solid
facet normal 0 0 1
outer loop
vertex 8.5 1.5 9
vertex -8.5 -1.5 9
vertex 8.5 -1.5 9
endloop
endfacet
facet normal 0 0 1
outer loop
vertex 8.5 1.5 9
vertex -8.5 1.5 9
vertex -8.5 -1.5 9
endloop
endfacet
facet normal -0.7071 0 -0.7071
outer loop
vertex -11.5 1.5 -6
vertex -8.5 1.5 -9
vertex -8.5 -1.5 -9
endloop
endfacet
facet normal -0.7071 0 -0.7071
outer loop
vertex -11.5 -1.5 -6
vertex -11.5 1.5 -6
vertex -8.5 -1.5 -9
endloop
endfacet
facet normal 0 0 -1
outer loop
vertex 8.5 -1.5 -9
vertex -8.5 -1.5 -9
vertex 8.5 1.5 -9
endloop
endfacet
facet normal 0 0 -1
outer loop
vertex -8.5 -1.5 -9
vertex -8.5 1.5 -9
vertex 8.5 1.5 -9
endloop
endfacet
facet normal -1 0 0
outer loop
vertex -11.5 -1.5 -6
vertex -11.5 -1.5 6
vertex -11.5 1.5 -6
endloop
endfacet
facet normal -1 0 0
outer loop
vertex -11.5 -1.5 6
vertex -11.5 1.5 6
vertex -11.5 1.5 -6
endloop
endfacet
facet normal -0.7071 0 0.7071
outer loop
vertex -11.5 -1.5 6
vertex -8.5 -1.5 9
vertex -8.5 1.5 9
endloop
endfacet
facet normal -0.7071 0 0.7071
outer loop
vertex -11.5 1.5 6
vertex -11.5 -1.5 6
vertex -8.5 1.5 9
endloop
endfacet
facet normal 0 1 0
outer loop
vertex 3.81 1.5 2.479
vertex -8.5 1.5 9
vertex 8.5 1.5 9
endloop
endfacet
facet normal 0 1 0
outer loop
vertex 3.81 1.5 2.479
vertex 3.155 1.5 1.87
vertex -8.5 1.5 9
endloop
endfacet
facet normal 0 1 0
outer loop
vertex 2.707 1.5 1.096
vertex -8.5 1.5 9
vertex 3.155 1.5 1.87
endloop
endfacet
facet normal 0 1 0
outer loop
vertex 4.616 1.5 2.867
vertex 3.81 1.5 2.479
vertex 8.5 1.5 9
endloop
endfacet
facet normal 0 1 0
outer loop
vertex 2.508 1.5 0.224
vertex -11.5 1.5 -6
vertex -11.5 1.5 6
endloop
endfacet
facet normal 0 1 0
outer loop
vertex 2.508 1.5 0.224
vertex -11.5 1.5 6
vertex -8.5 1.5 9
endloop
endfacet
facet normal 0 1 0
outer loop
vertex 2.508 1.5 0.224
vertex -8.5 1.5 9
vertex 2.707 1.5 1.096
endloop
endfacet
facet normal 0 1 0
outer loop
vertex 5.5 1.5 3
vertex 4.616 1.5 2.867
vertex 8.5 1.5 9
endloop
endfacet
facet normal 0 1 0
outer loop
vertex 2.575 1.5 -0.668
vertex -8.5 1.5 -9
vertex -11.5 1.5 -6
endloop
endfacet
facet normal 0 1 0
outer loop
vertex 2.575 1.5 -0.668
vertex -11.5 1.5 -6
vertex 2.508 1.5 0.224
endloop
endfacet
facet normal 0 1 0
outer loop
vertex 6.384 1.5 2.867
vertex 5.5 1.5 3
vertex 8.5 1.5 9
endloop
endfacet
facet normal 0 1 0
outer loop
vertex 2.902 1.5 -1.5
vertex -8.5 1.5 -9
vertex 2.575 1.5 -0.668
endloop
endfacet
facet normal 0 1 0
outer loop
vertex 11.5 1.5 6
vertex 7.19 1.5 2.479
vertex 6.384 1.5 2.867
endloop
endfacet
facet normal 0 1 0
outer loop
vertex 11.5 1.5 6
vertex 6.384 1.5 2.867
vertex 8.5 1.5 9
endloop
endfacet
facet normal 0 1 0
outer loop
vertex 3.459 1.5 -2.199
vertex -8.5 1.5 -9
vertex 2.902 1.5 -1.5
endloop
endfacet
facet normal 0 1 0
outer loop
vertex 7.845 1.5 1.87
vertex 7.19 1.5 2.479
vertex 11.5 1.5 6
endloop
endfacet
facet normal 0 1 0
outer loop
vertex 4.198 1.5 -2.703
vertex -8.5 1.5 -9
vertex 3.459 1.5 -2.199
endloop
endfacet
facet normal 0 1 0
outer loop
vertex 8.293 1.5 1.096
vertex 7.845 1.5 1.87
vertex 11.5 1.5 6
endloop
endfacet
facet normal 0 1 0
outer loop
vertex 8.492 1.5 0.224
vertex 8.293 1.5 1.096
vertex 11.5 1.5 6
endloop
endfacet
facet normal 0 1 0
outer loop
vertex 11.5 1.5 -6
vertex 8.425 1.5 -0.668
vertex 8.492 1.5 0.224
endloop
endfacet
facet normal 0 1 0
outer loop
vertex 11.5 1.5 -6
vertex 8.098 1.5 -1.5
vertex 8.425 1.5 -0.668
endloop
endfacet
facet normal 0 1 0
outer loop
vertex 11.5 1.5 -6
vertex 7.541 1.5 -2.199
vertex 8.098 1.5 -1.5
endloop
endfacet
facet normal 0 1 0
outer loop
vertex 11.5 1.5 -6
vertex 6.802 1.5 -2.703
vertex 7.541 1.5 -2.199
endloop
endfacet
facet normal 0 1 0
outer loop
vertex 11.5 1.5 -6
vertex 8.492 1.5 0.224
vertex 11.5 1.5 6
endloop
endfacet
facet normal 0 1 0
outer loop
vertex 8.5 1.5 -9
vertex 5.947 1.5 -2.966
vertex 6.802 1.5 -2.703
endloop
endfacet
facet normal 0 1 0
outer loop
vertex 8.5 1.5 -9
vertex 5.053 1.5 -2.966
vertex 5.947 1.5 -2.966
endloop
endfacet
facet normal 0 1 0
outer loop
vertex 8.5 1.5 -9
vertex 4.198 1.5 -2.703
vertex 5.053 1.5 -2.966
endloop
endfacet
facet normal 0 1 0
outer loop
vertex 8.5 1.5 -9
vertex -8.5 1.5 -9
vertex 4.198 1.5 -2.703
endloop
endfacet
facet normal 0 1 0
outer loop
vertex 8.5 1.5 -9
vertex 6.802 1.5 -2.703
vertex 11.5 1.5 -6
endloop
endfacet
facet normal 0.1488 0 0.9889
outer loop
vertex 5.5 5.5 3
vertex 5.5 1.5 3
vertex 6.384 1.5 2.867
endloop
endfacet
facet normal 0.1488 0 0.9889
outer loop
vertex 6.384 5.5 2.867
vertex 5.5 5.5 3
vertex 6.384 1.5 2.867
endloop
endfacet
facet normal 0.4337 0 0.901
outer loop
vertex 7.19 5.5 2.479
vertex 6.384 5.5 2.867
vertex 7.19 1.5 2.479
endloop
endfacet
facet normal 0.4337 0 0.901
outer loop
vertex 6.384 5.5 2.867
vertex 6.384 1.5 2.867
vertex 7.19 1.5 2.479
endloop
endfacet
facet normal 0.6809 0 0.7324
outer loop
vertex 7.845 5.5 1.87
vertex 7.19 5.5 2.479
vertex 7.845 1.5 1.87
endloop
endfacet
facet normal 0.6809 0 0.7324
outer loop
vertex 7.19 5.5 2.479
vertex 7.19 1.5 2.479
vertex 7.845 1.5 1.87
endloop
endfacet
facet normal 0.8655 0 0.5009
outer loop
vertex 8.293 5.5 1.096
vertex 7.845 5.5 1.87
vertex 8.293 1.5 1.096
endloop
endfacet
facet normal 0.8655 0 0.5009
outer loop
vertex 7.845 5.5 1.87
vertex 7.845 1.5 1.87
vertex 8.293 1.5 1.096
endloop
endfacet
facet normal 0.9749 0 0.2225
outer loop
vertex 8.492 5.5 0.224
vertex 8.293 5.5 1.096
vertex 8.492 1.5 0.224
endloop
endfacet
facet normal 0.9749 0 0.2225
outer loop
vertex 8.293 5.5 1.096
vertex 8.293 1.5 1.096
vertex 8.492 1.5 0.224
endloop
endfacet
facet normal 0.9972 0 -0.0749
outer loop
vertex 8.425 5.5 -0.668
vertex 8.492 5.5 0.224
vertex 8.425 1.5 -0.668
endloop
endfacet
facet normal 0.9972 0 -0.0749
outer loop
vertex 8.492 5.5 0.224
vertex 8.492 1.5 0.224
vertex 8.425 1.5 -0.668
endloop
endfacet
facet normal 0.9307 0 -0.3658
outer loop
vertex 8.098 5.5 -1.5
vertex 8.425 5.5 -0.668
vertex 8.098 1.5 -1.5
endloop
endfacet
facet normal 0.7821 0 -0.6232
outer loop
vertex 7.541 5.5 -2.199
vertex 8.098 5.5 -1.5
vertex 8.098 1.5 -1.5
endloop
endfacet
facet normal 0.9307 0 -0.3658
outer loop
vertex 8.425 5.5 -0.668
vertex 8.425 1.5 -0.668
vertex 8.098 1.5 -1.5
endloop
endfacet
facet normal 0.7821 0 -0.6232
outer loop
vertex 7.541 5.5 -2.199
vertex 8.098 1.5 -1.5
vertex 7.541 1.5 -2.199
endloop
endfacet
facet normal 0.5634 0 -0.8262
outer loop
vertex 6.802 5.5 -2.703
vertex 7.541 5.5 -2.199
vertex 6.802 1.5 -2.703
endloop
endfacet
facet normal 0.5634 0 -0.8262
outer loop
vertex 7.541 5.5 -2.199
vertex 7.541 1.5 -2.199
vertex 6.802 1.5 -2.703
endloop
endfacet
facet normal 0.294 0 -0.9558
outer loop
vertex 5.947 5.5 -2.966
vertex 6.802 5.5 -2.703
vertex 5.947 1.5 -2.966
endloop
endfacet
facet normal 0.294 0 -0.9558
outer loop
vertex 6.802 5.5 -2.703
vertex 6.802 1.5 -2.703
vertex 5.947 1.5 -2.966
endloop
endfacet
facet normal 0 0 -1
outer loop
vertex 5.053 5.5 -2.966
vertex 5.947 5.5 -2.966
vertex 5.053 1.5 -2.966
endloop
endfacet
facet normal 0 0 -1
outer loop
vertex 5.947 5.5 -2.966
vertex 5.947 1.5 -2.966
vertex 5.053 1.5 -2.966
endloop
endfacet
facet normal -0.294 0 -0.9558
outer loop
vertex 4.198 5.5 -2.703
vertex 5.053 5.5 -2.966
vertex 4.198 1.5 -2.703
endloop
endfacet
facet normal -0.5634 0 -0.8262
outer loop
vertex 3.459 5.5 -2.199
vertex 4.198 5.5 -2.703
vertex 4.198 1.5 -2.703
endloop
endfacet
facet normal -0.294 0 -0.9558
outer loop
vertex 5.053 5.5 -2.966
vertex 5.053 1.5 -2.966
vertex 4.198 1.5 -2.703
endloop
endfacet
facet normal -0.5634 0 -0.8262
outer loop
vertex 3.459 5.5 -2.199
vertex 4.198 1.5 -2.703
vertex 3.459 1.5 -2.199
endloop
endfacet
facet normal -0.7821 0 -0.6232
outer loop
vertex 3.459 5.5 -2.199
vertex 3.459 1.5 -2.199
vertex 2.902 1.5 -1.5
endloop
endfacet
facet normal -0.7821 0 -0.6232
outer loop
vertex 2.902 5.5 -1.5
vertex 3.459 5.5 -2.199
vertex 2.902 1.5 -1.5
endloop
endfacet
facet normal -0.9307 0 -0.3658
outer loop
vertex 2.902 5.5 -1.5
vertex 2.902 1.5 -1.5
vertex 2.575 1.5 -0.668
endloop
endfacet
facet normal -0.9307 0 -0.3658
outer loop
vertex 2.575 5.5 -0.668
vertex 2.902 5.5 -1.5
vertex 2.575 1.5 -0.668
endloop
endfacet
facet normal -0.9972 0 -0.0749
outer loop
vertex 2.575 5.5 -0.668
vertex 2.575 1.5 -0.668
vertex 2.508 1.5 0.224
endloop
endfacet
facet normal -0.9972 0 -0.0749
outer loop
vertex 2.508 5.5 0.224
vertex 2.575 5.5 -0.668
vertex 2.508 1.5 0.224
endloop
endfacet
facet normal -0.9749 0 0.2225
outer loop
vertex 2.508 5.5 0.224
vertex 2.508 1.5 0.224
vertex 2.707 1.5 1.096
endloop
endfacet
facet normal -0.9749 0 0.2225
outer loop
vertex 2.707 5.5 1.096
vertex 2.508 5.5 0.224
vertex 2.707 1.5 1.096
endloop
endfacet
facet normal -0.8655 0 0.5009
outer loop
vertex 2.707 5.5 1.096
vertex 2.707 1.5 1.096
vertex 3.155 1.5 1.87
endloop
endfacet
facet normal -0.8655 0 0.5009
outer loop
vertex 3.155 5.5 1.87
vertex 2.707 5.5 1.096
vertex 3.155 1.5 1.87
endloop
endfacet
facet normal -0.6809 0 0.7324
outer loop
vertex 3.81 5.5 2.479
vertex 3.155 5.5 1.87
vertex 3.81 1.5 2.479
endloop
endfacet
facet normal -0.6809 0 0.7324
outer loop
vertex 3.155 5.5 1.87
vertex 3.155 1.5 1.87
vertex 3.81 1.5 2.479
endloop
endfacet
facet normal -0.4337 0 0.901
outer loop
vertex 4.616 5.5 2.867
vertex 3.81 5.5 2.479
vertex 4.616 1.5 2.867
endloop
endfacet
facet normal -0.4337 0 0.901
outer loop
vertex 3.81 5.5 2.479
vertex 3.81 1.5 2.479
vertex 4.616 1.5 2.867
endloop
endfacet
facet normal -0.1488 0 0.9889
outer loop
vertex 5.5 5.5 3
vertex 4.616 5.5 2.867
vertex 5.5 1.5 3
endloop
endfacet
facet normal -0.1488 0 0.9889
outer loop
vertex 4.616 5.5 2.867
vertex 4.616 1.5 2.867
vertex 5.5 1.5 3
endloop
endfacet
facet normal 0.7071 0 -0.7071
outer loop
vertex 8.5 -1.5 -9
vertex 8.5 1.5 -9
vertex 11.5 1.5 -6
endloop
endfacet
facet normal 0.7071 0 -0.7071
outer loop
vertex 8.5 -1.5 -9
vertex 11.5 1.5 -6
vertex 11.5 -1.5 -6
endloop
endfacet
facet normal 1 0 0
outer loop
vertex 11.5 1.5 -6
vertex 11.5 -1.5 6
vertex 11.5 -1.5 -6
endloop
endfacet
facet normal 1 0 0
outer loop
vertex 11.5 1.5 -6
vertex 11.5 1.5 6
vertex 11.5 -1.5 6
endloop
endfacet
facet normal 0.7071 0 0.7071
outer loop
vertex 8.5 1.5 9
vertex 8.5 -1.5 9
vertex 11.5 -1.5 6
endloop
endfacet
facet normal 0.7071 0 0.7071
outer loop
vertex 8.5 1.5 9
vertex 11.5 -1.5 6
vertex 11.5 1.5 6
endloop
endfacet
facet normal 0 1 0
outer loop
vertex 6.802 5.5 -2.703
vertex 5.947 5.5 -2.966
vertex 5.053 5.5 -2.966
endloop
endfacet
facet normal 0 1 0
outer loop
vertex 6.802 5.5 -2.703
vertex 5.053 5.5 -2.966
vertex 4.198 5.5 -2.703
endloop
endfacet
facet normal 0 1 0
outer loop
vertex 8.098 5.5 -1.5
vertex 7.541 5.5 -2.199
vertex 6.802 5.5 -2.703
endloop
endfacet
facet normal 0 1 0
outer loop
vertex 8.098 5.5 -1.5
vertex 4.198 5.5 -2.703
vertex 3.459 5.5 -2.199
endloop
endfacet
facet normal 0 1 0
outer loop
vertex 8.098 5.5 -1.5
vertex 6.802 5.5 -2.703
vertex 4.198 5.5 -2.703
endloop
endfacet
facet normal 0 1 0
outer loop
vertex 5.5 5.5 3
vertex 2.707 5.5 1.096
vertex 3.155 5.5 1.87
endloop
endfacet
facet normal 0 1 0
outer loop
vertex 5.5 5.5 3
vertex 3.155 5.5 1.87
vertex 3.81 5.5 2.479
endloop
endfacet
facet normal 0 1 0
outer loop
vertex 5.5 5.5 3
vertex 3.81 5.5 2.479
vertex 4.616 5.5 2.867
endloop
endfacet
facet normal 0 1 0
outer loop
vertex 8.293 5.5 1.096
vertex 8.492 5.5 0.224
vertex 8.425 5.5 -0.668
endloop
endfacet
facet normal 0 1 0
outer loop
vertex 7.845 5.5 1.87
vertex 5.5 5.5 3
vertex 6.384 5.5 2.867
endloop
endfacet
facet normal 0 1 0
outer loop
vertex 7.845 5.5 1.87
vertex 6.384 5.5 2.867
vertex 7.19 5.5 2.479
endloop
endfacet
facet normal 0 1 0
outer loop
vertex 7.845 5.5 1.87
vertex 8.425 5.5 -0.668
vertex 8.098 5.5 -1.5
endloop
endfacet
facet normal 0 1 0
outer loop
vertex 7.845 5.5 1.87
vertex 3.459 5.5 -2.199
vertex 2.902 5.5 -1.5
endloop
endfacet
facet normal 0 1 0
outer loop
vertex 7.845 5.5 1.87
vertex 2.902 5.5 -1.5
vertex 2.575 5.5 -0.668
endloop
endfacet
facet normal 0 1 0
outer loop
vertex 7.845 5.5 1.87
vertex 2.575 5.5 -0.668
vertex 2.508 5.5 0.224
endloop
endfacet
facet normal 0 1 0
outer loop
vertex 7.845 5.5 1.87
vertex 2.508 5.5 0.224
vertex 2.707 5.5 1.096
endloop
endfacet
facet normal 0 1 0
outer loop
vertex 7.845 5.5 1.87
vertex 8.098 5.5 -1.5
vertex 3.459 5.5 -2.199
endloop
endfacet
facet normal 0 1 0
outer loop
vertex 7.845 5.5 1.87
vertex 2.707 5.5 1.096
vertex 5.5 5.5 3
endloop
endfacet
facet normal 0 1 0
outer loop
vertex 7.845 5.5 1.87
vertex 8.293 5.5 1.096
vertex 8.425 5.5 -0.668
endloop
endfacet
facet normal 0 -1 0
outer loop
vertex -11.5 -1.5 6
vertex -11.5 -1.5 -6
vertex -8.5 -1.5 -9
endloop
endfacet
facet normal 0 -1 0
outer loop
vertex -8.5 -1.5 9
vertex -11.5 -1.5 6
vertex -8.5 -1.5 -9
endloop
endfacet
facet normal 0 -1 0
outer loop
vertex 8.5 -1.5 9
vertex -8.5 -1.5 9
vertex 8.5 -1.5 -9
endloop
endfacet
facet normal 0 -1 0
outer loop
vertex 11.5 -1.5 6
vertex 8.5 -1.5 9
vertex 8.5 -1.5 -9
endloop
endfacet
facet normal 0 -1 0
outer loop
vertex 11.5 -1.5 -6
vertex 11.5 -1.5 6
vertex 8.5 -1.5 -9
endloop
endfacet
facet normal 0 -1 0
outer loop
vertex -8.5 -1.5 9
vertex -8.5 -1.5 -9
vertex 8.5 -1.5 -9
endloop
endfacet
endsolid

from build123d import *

# Parameters (mm, degrees)
SKETCH_1_W      = 23
SKETCH_1_H      = 18
EXTRUDE_1_DEPTH = 1.5
CHAMFER_1_SIZE  = 3
SKETCH_2_R      = 3
EXTRUDE_2_DEPTH = 4


with BuildPart() as part:
    # 草图1 → 凸台-拉伸1 (new, symmetric)
    with BuildSketch(Plane(origin=(0, 0, 0), x_dir=(1, 0, 0), z_dir=(0, 1, 0))):
        Rectangle(SKETCH_1_W, SKETCH_1_H)
    extrude(amount=EXTRUDE_1_DEPTH, both=True)

    # 倒角1
    chamfer_1_edges = [part.edges().sort_by_distance(p)[0] for p in [
        (11.5, 0, 9),
        (-11.5, 0, 9),
        (-11.5, 0, -9),
        (11.5, 0, -9),
    ]]
    chamfer(chamfer_1_edges, length=CHAMFER_1_SIZE)

    # 草图2 → 凸台-拉伸2 (add)
    with BuildSketch(Plane(origin=(0, 1.5, 0), x_dir=(1, 0, 0), z_dir=(0, 1, 0))):
        with Locations(Location((5.5, 0, 0), (0, 0, 270))):
            Circle(SKETCH_2_R)
    extrude(amount=EXTRUDE_2_DEPTH)


solid = part.part
